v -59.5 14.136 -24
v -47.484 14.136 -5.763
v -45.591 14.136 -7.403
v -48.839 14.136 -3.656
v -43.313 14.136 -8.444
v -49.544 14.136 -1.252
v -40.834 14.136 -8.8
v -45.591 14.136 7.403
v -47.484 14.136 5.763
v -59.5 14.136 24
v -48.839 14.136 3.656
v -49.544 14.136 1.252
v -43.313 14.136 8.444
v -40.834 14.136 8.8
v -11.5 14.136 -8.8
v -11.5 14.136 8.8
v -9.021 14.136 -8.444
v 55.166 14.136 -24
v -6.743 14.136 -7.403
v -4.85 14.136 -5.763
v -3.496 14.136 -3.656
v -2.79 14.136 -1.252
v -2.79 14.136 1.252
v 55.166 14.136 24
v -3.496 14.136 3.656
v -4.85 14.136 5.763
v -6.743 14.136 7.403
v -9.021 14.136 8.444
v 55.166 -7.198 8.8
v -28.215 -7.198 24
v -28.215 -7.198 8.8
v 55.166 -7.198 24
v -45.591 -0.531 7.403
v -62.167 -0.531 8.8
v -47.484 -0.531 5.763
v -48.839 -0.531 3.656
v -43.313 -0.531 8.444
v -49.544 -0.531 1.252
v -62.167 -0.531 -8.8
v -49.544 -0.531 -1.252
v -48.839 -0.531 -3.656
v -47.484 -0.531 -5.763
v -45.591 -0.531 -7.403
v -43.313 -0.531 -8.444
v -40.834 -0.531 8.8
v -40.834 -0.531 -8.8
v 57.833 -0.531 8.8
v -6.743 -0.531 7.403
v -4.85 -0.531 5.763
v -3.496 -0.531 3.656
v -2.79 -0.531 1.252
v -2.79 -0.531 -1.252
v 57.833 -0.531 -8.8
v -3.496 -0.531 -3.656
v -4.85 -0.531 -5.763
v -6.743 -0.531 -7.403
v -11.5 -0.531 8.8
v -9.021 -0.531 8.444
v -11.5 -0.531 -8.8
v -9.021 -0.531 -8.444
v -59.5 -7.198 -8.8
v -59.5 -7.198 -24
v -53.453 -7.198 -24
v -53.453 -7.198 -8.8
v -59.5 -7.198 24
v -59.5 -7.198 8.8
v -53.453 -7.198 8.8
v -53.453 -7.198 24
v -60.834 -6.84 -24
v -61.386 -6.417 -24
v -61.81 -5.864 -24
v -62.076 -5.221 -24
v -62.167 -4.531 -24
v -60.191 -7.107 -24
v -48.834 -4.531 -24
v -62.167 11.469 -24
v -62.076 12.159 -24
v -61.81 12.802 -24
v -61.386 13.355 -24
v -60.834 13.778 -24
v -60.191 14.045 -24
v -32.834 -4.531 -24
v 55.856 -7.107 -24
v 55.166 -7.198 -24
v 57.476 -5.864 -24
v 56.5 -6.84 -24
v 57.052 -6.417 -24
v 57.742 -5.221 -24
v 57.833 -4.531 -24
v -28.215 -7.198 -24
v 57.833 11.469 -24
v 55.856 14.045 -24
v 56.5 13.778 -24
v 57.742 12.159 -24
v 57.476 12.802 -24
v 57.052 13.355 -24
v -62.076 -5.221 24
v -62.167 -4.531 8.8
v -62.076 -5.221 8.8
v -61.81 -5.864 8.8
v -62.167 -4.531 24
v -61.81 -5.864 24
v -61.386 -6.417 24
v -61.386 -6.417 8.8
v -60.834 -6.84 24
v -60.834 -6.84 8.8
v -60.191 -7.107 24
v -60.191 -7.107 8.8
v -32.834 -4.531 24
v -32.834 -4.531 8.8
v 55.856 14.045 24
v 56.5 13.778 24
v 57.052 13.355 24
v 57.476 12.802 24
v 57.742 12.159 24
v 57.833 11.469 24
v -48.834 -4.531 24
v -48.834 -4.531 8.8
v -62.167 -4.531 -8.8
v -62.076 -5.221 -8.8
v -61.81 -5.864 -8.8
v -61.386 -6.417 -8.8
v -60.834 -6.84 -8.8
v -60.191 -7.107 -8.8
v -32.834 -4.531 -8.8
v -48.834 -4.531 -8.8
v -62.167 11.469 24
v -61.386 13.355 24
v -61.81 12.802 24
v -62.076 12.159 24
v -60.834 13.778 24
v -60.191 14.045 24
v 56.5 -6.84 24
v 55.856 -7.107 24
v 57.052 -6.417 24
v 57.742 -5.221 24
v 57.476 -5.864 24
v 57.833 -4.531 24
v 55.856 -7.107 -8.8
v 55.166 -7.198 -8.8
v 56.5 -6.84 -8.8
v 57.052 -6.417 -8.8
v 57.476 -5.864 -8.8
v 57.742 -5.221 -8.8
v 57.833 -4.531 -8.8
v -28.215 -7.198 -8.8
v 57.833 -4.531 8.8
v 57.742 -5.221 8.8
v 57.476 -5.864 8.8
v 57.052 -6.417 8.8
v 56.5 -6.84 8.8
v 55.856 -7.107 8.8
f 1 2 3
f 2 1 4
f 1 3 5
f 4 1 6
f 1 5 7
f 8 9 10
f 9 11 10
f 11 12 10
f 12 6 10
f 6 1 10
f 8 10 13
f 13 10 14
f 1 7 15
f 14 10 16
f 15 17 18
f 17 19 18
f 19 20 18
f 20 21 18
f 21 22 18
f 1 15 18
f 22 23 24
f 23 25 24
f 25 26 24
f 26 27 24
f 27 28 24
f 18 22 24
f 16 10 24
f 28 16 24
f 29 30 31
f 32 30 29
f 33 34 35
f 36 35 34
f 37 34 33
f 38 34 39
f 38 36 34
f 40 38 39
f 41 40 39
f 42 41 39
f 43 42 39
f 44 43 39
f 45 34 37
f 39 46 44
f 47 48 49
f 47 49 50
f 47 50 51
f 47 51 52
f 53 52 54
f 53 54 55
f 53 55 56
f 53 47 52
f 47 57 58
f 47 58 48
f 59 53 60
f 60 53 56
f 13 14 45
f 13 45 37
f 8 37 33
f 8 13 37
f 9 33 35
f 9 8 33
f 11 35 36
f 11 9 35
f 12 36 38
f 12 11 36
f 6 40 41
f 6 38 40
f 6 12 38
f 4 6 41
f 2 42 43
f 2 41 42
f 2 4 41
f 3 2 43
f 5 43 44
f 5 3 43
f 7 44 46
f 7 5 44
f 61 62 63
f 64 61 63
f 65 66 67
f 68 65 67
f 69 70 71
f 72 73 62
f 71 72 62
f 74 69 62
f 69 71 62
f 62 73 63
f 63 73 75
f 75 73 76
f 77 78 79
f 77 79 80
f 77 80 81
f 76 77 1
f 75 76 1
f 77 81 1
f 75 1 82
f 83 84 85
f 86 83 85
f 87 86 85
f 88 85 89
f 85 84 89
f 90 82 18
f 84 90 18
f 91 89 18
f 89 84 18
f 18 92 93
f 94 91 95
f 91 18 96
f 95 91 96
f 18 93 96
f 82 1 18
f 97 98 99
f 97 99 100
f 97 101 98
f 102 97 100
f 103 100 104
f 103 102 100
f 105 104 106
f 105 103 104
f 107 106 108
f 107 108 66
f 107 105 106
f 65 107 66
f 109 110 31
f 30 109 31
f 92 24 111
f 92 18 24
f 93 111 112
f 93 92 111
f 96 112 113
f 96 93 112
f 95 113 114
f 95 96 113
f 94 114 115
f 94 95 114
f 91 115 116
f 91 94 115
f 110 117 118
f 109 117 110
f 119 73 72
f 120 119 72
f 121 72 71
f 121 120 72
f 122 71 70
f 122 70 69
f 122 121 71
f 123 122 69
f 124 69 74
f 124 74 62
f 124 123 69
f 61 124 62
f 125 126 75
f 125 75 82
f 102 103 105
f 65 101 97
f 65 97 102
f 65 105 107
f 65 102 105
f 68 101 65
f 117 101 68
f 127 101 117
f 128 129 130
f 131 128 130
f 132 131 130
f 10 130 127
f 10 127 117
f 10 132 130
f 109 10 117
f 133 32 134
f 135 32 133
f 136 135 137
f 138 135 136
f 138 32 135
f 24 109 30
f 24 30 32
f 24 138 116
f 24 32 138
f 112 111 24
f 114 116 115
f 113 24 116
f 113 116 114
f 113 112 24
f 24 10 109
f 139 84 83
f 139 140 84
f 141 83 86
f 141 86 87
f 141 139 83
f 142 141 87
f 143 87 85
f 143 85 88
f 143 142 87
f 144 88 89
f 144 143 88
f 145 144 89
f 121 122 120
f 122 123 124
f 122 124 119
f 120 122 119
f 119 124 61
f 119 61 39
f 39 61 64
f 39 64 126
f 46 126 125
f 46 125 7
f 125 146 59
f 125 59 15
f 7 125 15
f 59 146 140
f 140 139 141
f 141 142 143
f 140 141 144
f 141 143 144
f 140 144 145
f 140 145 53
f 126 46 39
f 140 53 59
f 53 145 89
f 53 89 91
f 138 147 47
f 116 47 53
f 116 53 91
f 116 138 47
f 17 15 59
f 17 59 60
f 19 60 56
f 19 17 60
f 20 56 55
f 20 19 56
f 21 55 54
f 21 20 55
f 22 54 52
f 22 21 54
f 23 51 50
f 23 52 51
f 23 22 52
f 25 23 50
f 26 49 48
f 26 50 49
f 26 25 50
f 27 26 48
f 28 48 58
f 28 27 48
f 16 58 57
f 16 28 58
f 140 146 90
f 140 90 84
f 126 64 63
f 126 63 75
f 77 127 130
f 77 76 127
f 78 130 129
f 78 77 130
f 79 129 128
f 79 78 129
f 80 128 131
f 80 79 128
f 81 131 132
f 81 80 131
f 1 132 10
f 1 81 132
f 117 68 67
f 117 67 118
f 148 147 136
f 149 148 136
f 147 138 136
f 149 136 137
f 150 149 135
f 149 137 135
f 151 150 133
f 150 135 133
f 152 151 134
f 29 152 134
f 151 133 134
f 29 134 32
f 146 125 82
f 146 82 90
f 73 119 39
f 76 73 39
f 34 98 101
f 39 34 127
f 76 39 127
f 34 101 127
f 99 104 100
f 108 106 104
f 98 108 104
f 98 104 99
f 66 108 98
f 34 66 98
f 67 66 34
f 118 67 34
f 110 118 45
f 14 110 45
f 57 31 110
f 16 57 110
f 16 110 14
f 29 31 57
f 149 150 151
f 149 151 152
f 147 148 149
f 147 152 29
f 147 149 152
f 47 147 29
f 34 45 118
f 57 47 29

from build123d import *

# Parameters (mm, degrees)
SKETCH_1_W          = 45
SKETCH_1_H          = 8
EXTRUDE_1_DEPTH     = 9
CUT_EXTRUDE_1_DEPTH = 26.51960031
SKETCH_4_W          = 6.6
SKETCH_4_H          = 2.5
CUT_EXTRUDE_2_DEPTH = 47.583258795
CUT_EXTRUDE_3_DEPTH = 30.904013109
FILLET_1_R          = 1
SCALE_1_SCALE       = 2.666666667


with BuildPart() as part:
    # 草图1 → 凸台-拉伸1 (new, symmetric)
    with BuildSketch(Plane.XY):
        with Locations((0, 4)):
            Rectangle(SKETCH_1_W, SKETCH_1_H)
    extrude(amount=EXTRUDE_1_DEPTH, both=True)

    # 草图2 → 切除-拉伸1 (cut, through all)
    with BuildSketch(Plane(origin=(0, 8, 0), x_dir=(1, 0, 0), z_dir=(0, 1, 0))):
        with BuildLine():
            Line((-14.5, 3.3), (-3.5, 3.3))
            ThreePointArc((-3.5, 3.3), (-0.2, 0), (-3.5, -3.3))
            Line((-3.5, -3.3), (-14.5, -3.3))
            ThreePointArc((-14.5, -3.3), (-17.8, 0), (-14.5, 3.3))
        make_face()
    extrude(amount=-CUT_EXTRUDE_1_DEPTH, mode=Mode.SUBTRACT)

    # 草图4 → 切除-拉伸2 (cut, through all)
    with BuildSketch(Plane(origin=(22.5, 0, 0), x_dir=(0, 0, -1), z_dir=(1, 0, 0))):
        with Locations((0, 1.25)):
            Rectangle(SKETCH_4_W, SKETCH_4_H)
    extrude(amount=-CUT_EXTRUDE_2_DEPTH, mode=Mode.SUBTRACT)

    # 草图5 → 切除-拉伸3 (cut, through all)
    with BuildSketch(Plane.XY.offset(9)):
        Polygon((-17.5, 1), (-11.5, 1), (-9.767949192, 0), (-19.232050808, 0), align=None)
    extrude(amount=-CUT_EXTRUDE_3_DEPTH, mode=Mode.SUBTRACT)

    # 圆角1
    fillet_1_edges = [part.edges().sort_by_distance(p)[0] for p in [
        (22.5, 0, -6.15),
        (-22.5, 0, -6.15),
        (-22.5, 8, 0),
        (22.5, 8, 0),
        (22.5, 0, 6.15),
        (-22.5, 0, 6.15),
    ]]
    fillet(fillet_1_edges, radius=FILLET_1_R)


with BuildPart() as part_1:
    # 缩放比例1: scaled about (1.300247122, 4.318589473, 0)
    add(part.part.scale(SCALE_1_SCALE).moved(Location((-2.167078537, -7.197649122, 0))))


solid = part_1.part
